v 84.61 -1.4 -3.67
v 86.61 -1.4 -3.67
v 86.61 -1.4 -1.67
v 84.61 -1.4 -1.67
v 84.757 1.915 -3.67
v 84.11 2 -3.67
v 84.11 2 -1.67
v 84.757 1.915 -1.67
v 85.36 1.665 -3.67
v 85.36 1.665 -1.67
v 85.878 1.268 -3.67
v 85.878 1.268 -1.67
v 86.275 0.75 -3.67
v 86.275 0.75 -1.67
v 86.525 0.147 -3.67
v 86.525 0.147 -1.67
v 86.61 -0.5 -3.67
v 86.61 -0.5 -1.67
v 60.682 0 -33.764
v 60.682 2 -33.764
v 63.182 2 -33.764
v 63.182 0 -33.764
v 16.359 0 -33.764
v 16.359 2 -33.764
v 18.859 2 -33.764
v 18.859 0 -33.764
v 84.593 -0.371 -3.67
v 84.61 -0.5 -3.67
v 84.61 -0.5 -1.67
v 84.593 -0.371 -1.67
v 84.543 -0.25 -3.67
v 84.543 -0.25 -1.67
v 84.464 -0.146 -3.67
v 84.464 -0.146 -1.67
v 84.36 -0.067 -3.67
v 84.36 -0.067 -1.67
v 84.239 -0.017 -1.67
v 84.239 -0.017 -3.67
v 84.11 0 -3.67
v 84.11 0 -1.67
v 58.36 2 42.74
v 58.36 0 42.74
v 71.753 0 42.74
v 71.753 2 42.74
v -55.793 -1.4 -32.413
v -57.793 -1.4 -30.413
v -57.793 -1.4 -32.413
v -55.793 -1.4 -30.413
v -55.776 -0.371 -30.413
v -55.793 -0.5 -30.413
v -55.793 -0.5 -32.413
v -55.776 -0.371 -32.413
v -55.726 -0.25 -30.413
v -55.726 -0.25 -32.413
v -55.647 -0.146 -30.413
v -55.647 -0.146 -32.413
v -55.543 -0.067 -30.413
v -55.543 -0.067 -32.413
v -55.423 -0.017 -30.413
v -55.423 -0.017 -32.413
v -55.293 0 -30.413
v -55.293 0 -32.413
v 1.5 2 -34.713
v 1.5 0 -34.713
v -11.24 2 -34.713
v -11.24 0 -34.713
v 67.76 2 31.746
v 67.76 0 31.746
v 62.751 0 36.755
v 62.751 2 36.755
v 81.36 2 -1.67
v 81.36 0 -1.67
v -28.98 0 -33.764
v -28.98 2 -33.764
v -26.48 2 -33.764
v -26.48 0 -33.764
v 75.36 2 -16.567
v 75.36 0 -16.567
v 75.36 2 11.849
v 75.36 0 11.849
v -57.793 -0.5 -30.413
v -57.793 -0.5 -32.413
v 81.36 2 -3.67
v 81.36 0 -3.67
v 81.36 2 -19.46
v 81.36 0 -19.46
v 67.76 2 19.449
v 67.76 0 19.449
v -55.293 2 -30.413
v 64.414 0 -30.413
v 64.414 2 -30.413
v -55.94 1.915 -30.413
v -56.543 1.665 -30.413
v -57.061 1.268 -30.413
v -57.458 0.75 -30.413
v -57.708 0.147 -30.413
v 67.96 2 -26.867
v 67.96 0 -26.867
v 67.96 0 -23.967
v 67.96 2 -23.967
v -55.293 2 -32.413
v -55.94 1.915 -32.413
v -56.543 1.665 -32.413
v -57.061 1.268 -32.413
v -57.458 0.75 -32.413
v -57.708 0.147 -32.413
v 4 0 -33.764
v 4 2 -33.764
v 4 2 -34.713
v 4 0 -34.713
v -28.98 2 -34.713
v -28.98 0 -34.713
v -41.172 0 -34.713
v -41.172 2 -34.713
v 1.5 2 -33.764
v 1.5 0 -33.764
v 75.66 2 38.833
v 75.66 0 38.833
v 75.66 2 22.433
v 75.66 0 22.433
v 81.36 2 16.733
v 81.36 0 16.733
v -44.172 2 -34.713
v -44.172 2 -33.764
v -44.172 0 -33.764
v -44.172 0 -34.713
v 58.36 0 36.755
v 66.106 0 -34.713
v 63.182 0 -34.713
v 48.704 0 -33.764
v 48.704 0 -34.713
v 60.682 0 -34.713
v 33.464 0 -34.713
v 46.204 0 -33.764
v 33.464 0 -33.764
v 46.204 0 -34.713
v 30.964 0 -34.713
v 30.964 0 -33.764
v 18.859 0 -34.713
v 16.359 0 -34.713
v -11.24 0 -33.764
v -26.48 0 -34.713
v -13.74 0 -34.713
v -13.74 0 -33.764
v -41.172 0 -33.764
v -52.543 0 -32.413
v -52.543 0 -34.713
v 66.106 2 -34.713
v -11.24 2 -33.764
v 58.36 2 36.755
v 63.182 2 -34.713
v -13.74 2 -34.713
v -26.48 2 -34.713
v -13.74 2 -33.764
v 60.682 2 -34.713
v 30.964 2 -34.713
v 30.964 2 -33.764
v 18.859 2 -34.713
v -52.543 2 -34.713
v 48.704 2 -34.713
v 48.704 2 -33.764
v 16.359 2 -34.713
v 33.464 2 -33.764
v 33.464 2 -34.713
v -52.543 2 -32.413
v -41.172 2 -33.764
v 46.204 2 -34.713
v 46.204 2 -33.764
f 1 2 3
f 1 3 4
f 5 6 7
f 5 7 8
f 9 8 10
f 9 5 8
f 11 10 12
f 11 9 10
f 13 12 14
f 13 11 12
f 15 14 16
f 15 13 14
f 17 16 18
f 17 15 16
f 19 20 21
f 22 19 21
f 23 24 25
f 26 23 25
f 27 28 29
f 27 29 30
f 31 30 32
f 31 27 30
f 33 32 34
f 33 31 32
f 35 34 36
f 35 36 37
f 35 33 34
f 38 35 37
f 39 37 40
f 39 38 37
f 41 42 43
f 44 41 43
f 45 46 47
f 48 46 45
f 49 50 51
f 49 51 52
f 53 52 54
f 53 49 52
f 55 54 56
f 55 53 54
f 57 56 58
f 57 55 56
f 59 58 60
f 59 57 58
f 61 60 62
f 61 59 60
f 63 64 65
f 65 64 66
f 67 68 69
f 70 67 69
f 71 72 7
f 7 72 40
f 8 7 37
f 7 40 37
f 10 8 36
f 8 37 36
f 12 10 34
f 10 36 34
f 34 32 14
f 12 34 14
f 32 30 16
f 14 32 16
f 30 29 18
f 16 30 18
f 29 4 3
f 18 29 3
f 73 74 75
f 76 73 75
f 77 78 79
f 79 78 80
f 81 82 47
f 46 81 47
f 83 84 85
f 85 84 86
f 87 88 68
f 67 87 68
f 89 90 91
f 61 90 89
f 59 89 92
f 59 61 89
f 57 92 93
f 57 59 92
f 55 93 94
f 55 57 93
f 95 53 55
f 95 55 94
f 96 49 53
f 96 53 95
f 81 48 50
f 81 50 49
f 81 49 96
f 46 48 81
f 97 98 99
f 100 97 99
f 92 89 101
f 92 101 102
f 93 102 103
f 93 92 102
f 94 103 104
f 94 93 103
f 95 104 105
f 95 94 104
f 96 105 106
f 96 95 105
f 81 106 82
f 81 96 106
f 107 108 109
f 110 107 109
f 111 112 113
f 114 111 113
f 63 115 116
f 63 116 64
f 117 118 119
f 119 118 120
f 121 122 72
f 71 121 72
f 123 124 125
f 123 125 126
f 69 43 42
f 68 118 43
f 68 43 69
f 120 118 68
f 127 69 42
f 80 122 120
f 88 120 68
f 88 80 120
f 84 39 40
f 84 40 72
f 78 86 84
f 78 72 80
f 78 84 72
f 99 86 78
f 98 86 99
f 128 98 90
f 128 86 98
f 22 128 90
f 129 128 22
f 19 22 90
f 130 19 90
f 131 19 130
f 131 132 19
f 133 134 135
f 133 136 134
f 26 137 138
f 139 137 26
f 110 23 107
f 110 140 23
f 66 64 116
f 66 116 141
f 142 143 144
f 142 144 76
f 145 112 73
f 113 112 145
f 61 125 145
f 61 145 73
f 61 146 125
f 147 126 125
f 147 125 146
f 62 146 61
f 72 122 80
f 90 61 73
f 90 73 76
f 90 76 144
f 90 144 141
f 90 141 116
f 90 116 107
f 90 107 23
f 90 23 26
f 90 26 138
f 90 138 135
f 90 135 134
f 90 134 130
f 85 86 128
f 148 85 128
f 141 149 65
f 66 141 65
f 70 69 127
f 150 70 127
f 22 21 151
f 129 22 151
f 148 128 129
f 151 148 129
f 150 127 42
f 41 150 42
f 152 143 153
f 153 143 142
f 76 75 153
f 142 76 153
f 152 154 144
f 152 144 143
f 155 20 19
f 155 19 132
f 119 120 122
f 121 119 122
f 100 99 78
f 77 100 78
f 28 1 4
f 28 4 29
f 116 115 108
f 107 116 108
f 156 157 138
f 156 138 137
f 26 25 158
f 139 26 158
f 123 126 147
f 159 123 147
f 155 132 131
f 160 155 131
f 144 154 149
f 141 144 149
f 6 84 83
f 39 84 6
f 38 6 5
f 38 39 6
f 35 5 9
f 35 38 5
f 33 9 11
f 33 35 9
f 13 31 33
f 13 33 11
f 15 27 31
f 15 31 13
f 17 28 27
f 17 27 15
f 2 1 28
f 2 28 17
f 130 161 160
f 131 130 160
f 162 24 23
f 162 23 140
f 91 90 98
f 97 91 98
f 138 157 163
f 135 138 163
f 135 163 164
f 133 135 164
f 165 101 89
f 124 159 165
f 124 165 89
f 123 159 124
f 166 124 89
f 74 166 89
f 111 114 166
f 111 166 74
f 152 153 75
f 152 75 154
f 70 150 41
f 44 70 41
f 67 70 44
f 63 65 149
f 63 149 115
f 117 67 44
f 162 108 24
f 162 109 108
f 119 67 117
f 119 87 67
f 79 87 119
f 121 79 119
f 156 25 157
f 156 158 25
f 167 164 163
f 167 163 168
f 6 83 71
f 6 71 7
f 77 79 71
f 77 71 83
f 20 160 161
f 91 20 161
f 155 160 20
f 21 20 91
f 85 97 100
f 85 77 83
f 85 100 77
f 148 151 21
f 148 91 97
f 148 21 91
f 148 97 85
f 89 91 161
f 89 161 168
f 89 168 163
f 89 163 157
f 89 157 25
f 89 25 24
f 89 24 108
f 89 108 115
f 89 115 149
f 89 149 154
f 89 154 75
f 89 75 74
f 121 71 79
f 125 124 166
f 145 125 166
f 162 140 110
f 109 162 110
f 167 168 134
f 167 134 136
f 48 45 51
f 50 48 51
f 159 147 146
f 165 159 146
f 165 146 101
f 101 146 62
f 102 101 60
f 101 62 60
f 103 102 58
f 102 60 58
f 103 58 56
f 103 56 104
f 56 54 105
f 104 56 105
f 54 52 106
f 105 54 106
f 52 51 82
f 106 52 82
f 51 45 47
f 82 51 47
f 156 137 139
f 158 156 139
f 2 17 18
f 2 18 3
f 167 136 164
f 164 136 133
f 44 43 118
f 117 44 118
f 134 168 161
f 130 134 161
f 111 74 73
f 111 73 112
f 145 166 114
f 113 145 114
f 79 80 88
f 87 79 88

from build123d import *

# Parameters (mm, degrees)
BOSS_EXTRUDE1_DEPTH = 2
EDGE_FLANGE1_DEPTH  = 2
EDGE_FLANGE2_DEPTH  = 2
SKETCH13_W          = 2.5
SKETCH13_H          = 2.15
SKETCH13_W_2        = 3
CUT_EXTRUDE3_DEPTH  = 10


# Sheet-metal steps are written as plain solids
with BuildPart() as part:
    # Sketch2 → Boss-Extrude1 (new body)
    with BuildSketch(Plane(origin=(0, 0, 0), x_dir=(1, 0, 0), z_dir=(0, 1, 0))):
        Polygon((-52.543309772, 32.413356753), (-54.793309772, 32.413356753), (-54.793309772, 30.413356753), (64.413548219, 30.413356753), (67.959993108, 26.866911863), (67.959993108, 23.966910068), (75.359993548, 16.566912168), (75.359993548, -11.849150158), (67.759993508, -19.449150198), (67.759993508, -31.745752353), (62.750836838, -36.754909023), (58.359994528, -36.754909023), (58.359994528, -42.739906444), (71.753176861, -42.739906444), (75.659994488, -38.833088817), (75.659994488, -22.433088597), (81.359993248, -16.733089837), (81.359993248, 1.669814581), (83.609993248, 1.669814581), (83.609993248, 3.669814581), (81.359993248, 3.669814581), (81.359993248, 19.459804242), (66.106440177, 34.713357313), (-52.543309772, 34.713357313), align=None)
    extrude(amount=BOSS_EXTRUDE1_DEPTH)

    # Edge-Flange1 section (across the edge) → Edge-Flange1 (add)
    with BuildSketch(Plane(origin=(-55.793309772, 0, -30.413356753), x_dir=(1, 0, 0), z_dir=(0, 0, -1))):
        with BuildLine():
            Line((-2, 0.5), (-2, 1.4))
            Line((-2, 1.4), (0, 1.4))
            Line((0, 1.4), (0, 0.5))
            ThreePointArc((0, 0.5), (0.146446609, 0.146446609), (0.5, 0))
            Line((0.5, 0), (1, 0))
            Line((1, 0), (1, -2))
            Line((1, -2), (0.5, -2))
            ThreePointArc((0.5, -2), (-1.267766953, -1.267766953), (-2, 0.5))
        make_face()
    extrude(amount=EDGE_FLANGE1_DEPTH)

    # Edge-Flange2 section (across the edge) → Edge-Flange2 (add)
    with BuildSketch(Plane(origin=(84.609993248, 0, -3.669814581), x_dir=(-1, 0, 0), z_dir=(0, 0, 1))):
        with BuildLine():
            Line((-2, 0.5), (-2, 1.4))
            Line((-2, 1.4), (0, 1.4))
            Line((0, 1.4), (0, 0.5))
            ThreePointArc((0, 0.5), (0.146446609, 0.146446609), (0.5, 0))
            Line((0.5, 0), (1, 0))
            Line((1, 0), (1, -2))
            Line((1, -2), (0.5, -2))
            ThreePointArc((0.5, -2), (-1.267766953, -1.267766953), (-2, 0.5))
        make_face()
    extrude(amount=EDGE_FLANGE2_DEPTH)

    # Sketch13 → Cut-Extrude3 (cut)
    with BuildSketch(Plane(origin=(0, 2, 0), x_dir=(1, 0, 0), z_dir=(0, 1, 0))):
        with Locations((-27.730006168, 34.839358373)):
            Rectangle(SKETCH13_W, SKETCH13_H)
        with Locations((-42.672006168, 34.839358373)):
            Rectangle(SKETCH13_W_2, SKETCH13_H)
        with Locations((-12.490006168, 34.839358373)):
            Rectangle(SKETCH13_W, SKETCH13_H)
        with Locations((2.749993832, 34.839358373)):
            Rectangle(SKETCH13_W, SKETCH13_H)
        with Locations((17.608993832, 34.839358373)):
            Rectangle(SKETCH13_W, SKETCH13_H)
        with Locations((32.213993832, 34.839358373)):
            Rectangle(SKETCH13_W, SKETCH13_H)
        with Locations((47.453993832, 34.839358373)):
            Rectangle(SKETCH13_W, SKETCH13_H)
        with Locations((61.931993832, 34.839358373)):
            Rectangle(SKETCH13_W, SKETCH13_H)
    extrude(amount=-CUT_EXTRUDE3_DEPTH, mode=Mode.SUBTRACT)


solid = part.part
